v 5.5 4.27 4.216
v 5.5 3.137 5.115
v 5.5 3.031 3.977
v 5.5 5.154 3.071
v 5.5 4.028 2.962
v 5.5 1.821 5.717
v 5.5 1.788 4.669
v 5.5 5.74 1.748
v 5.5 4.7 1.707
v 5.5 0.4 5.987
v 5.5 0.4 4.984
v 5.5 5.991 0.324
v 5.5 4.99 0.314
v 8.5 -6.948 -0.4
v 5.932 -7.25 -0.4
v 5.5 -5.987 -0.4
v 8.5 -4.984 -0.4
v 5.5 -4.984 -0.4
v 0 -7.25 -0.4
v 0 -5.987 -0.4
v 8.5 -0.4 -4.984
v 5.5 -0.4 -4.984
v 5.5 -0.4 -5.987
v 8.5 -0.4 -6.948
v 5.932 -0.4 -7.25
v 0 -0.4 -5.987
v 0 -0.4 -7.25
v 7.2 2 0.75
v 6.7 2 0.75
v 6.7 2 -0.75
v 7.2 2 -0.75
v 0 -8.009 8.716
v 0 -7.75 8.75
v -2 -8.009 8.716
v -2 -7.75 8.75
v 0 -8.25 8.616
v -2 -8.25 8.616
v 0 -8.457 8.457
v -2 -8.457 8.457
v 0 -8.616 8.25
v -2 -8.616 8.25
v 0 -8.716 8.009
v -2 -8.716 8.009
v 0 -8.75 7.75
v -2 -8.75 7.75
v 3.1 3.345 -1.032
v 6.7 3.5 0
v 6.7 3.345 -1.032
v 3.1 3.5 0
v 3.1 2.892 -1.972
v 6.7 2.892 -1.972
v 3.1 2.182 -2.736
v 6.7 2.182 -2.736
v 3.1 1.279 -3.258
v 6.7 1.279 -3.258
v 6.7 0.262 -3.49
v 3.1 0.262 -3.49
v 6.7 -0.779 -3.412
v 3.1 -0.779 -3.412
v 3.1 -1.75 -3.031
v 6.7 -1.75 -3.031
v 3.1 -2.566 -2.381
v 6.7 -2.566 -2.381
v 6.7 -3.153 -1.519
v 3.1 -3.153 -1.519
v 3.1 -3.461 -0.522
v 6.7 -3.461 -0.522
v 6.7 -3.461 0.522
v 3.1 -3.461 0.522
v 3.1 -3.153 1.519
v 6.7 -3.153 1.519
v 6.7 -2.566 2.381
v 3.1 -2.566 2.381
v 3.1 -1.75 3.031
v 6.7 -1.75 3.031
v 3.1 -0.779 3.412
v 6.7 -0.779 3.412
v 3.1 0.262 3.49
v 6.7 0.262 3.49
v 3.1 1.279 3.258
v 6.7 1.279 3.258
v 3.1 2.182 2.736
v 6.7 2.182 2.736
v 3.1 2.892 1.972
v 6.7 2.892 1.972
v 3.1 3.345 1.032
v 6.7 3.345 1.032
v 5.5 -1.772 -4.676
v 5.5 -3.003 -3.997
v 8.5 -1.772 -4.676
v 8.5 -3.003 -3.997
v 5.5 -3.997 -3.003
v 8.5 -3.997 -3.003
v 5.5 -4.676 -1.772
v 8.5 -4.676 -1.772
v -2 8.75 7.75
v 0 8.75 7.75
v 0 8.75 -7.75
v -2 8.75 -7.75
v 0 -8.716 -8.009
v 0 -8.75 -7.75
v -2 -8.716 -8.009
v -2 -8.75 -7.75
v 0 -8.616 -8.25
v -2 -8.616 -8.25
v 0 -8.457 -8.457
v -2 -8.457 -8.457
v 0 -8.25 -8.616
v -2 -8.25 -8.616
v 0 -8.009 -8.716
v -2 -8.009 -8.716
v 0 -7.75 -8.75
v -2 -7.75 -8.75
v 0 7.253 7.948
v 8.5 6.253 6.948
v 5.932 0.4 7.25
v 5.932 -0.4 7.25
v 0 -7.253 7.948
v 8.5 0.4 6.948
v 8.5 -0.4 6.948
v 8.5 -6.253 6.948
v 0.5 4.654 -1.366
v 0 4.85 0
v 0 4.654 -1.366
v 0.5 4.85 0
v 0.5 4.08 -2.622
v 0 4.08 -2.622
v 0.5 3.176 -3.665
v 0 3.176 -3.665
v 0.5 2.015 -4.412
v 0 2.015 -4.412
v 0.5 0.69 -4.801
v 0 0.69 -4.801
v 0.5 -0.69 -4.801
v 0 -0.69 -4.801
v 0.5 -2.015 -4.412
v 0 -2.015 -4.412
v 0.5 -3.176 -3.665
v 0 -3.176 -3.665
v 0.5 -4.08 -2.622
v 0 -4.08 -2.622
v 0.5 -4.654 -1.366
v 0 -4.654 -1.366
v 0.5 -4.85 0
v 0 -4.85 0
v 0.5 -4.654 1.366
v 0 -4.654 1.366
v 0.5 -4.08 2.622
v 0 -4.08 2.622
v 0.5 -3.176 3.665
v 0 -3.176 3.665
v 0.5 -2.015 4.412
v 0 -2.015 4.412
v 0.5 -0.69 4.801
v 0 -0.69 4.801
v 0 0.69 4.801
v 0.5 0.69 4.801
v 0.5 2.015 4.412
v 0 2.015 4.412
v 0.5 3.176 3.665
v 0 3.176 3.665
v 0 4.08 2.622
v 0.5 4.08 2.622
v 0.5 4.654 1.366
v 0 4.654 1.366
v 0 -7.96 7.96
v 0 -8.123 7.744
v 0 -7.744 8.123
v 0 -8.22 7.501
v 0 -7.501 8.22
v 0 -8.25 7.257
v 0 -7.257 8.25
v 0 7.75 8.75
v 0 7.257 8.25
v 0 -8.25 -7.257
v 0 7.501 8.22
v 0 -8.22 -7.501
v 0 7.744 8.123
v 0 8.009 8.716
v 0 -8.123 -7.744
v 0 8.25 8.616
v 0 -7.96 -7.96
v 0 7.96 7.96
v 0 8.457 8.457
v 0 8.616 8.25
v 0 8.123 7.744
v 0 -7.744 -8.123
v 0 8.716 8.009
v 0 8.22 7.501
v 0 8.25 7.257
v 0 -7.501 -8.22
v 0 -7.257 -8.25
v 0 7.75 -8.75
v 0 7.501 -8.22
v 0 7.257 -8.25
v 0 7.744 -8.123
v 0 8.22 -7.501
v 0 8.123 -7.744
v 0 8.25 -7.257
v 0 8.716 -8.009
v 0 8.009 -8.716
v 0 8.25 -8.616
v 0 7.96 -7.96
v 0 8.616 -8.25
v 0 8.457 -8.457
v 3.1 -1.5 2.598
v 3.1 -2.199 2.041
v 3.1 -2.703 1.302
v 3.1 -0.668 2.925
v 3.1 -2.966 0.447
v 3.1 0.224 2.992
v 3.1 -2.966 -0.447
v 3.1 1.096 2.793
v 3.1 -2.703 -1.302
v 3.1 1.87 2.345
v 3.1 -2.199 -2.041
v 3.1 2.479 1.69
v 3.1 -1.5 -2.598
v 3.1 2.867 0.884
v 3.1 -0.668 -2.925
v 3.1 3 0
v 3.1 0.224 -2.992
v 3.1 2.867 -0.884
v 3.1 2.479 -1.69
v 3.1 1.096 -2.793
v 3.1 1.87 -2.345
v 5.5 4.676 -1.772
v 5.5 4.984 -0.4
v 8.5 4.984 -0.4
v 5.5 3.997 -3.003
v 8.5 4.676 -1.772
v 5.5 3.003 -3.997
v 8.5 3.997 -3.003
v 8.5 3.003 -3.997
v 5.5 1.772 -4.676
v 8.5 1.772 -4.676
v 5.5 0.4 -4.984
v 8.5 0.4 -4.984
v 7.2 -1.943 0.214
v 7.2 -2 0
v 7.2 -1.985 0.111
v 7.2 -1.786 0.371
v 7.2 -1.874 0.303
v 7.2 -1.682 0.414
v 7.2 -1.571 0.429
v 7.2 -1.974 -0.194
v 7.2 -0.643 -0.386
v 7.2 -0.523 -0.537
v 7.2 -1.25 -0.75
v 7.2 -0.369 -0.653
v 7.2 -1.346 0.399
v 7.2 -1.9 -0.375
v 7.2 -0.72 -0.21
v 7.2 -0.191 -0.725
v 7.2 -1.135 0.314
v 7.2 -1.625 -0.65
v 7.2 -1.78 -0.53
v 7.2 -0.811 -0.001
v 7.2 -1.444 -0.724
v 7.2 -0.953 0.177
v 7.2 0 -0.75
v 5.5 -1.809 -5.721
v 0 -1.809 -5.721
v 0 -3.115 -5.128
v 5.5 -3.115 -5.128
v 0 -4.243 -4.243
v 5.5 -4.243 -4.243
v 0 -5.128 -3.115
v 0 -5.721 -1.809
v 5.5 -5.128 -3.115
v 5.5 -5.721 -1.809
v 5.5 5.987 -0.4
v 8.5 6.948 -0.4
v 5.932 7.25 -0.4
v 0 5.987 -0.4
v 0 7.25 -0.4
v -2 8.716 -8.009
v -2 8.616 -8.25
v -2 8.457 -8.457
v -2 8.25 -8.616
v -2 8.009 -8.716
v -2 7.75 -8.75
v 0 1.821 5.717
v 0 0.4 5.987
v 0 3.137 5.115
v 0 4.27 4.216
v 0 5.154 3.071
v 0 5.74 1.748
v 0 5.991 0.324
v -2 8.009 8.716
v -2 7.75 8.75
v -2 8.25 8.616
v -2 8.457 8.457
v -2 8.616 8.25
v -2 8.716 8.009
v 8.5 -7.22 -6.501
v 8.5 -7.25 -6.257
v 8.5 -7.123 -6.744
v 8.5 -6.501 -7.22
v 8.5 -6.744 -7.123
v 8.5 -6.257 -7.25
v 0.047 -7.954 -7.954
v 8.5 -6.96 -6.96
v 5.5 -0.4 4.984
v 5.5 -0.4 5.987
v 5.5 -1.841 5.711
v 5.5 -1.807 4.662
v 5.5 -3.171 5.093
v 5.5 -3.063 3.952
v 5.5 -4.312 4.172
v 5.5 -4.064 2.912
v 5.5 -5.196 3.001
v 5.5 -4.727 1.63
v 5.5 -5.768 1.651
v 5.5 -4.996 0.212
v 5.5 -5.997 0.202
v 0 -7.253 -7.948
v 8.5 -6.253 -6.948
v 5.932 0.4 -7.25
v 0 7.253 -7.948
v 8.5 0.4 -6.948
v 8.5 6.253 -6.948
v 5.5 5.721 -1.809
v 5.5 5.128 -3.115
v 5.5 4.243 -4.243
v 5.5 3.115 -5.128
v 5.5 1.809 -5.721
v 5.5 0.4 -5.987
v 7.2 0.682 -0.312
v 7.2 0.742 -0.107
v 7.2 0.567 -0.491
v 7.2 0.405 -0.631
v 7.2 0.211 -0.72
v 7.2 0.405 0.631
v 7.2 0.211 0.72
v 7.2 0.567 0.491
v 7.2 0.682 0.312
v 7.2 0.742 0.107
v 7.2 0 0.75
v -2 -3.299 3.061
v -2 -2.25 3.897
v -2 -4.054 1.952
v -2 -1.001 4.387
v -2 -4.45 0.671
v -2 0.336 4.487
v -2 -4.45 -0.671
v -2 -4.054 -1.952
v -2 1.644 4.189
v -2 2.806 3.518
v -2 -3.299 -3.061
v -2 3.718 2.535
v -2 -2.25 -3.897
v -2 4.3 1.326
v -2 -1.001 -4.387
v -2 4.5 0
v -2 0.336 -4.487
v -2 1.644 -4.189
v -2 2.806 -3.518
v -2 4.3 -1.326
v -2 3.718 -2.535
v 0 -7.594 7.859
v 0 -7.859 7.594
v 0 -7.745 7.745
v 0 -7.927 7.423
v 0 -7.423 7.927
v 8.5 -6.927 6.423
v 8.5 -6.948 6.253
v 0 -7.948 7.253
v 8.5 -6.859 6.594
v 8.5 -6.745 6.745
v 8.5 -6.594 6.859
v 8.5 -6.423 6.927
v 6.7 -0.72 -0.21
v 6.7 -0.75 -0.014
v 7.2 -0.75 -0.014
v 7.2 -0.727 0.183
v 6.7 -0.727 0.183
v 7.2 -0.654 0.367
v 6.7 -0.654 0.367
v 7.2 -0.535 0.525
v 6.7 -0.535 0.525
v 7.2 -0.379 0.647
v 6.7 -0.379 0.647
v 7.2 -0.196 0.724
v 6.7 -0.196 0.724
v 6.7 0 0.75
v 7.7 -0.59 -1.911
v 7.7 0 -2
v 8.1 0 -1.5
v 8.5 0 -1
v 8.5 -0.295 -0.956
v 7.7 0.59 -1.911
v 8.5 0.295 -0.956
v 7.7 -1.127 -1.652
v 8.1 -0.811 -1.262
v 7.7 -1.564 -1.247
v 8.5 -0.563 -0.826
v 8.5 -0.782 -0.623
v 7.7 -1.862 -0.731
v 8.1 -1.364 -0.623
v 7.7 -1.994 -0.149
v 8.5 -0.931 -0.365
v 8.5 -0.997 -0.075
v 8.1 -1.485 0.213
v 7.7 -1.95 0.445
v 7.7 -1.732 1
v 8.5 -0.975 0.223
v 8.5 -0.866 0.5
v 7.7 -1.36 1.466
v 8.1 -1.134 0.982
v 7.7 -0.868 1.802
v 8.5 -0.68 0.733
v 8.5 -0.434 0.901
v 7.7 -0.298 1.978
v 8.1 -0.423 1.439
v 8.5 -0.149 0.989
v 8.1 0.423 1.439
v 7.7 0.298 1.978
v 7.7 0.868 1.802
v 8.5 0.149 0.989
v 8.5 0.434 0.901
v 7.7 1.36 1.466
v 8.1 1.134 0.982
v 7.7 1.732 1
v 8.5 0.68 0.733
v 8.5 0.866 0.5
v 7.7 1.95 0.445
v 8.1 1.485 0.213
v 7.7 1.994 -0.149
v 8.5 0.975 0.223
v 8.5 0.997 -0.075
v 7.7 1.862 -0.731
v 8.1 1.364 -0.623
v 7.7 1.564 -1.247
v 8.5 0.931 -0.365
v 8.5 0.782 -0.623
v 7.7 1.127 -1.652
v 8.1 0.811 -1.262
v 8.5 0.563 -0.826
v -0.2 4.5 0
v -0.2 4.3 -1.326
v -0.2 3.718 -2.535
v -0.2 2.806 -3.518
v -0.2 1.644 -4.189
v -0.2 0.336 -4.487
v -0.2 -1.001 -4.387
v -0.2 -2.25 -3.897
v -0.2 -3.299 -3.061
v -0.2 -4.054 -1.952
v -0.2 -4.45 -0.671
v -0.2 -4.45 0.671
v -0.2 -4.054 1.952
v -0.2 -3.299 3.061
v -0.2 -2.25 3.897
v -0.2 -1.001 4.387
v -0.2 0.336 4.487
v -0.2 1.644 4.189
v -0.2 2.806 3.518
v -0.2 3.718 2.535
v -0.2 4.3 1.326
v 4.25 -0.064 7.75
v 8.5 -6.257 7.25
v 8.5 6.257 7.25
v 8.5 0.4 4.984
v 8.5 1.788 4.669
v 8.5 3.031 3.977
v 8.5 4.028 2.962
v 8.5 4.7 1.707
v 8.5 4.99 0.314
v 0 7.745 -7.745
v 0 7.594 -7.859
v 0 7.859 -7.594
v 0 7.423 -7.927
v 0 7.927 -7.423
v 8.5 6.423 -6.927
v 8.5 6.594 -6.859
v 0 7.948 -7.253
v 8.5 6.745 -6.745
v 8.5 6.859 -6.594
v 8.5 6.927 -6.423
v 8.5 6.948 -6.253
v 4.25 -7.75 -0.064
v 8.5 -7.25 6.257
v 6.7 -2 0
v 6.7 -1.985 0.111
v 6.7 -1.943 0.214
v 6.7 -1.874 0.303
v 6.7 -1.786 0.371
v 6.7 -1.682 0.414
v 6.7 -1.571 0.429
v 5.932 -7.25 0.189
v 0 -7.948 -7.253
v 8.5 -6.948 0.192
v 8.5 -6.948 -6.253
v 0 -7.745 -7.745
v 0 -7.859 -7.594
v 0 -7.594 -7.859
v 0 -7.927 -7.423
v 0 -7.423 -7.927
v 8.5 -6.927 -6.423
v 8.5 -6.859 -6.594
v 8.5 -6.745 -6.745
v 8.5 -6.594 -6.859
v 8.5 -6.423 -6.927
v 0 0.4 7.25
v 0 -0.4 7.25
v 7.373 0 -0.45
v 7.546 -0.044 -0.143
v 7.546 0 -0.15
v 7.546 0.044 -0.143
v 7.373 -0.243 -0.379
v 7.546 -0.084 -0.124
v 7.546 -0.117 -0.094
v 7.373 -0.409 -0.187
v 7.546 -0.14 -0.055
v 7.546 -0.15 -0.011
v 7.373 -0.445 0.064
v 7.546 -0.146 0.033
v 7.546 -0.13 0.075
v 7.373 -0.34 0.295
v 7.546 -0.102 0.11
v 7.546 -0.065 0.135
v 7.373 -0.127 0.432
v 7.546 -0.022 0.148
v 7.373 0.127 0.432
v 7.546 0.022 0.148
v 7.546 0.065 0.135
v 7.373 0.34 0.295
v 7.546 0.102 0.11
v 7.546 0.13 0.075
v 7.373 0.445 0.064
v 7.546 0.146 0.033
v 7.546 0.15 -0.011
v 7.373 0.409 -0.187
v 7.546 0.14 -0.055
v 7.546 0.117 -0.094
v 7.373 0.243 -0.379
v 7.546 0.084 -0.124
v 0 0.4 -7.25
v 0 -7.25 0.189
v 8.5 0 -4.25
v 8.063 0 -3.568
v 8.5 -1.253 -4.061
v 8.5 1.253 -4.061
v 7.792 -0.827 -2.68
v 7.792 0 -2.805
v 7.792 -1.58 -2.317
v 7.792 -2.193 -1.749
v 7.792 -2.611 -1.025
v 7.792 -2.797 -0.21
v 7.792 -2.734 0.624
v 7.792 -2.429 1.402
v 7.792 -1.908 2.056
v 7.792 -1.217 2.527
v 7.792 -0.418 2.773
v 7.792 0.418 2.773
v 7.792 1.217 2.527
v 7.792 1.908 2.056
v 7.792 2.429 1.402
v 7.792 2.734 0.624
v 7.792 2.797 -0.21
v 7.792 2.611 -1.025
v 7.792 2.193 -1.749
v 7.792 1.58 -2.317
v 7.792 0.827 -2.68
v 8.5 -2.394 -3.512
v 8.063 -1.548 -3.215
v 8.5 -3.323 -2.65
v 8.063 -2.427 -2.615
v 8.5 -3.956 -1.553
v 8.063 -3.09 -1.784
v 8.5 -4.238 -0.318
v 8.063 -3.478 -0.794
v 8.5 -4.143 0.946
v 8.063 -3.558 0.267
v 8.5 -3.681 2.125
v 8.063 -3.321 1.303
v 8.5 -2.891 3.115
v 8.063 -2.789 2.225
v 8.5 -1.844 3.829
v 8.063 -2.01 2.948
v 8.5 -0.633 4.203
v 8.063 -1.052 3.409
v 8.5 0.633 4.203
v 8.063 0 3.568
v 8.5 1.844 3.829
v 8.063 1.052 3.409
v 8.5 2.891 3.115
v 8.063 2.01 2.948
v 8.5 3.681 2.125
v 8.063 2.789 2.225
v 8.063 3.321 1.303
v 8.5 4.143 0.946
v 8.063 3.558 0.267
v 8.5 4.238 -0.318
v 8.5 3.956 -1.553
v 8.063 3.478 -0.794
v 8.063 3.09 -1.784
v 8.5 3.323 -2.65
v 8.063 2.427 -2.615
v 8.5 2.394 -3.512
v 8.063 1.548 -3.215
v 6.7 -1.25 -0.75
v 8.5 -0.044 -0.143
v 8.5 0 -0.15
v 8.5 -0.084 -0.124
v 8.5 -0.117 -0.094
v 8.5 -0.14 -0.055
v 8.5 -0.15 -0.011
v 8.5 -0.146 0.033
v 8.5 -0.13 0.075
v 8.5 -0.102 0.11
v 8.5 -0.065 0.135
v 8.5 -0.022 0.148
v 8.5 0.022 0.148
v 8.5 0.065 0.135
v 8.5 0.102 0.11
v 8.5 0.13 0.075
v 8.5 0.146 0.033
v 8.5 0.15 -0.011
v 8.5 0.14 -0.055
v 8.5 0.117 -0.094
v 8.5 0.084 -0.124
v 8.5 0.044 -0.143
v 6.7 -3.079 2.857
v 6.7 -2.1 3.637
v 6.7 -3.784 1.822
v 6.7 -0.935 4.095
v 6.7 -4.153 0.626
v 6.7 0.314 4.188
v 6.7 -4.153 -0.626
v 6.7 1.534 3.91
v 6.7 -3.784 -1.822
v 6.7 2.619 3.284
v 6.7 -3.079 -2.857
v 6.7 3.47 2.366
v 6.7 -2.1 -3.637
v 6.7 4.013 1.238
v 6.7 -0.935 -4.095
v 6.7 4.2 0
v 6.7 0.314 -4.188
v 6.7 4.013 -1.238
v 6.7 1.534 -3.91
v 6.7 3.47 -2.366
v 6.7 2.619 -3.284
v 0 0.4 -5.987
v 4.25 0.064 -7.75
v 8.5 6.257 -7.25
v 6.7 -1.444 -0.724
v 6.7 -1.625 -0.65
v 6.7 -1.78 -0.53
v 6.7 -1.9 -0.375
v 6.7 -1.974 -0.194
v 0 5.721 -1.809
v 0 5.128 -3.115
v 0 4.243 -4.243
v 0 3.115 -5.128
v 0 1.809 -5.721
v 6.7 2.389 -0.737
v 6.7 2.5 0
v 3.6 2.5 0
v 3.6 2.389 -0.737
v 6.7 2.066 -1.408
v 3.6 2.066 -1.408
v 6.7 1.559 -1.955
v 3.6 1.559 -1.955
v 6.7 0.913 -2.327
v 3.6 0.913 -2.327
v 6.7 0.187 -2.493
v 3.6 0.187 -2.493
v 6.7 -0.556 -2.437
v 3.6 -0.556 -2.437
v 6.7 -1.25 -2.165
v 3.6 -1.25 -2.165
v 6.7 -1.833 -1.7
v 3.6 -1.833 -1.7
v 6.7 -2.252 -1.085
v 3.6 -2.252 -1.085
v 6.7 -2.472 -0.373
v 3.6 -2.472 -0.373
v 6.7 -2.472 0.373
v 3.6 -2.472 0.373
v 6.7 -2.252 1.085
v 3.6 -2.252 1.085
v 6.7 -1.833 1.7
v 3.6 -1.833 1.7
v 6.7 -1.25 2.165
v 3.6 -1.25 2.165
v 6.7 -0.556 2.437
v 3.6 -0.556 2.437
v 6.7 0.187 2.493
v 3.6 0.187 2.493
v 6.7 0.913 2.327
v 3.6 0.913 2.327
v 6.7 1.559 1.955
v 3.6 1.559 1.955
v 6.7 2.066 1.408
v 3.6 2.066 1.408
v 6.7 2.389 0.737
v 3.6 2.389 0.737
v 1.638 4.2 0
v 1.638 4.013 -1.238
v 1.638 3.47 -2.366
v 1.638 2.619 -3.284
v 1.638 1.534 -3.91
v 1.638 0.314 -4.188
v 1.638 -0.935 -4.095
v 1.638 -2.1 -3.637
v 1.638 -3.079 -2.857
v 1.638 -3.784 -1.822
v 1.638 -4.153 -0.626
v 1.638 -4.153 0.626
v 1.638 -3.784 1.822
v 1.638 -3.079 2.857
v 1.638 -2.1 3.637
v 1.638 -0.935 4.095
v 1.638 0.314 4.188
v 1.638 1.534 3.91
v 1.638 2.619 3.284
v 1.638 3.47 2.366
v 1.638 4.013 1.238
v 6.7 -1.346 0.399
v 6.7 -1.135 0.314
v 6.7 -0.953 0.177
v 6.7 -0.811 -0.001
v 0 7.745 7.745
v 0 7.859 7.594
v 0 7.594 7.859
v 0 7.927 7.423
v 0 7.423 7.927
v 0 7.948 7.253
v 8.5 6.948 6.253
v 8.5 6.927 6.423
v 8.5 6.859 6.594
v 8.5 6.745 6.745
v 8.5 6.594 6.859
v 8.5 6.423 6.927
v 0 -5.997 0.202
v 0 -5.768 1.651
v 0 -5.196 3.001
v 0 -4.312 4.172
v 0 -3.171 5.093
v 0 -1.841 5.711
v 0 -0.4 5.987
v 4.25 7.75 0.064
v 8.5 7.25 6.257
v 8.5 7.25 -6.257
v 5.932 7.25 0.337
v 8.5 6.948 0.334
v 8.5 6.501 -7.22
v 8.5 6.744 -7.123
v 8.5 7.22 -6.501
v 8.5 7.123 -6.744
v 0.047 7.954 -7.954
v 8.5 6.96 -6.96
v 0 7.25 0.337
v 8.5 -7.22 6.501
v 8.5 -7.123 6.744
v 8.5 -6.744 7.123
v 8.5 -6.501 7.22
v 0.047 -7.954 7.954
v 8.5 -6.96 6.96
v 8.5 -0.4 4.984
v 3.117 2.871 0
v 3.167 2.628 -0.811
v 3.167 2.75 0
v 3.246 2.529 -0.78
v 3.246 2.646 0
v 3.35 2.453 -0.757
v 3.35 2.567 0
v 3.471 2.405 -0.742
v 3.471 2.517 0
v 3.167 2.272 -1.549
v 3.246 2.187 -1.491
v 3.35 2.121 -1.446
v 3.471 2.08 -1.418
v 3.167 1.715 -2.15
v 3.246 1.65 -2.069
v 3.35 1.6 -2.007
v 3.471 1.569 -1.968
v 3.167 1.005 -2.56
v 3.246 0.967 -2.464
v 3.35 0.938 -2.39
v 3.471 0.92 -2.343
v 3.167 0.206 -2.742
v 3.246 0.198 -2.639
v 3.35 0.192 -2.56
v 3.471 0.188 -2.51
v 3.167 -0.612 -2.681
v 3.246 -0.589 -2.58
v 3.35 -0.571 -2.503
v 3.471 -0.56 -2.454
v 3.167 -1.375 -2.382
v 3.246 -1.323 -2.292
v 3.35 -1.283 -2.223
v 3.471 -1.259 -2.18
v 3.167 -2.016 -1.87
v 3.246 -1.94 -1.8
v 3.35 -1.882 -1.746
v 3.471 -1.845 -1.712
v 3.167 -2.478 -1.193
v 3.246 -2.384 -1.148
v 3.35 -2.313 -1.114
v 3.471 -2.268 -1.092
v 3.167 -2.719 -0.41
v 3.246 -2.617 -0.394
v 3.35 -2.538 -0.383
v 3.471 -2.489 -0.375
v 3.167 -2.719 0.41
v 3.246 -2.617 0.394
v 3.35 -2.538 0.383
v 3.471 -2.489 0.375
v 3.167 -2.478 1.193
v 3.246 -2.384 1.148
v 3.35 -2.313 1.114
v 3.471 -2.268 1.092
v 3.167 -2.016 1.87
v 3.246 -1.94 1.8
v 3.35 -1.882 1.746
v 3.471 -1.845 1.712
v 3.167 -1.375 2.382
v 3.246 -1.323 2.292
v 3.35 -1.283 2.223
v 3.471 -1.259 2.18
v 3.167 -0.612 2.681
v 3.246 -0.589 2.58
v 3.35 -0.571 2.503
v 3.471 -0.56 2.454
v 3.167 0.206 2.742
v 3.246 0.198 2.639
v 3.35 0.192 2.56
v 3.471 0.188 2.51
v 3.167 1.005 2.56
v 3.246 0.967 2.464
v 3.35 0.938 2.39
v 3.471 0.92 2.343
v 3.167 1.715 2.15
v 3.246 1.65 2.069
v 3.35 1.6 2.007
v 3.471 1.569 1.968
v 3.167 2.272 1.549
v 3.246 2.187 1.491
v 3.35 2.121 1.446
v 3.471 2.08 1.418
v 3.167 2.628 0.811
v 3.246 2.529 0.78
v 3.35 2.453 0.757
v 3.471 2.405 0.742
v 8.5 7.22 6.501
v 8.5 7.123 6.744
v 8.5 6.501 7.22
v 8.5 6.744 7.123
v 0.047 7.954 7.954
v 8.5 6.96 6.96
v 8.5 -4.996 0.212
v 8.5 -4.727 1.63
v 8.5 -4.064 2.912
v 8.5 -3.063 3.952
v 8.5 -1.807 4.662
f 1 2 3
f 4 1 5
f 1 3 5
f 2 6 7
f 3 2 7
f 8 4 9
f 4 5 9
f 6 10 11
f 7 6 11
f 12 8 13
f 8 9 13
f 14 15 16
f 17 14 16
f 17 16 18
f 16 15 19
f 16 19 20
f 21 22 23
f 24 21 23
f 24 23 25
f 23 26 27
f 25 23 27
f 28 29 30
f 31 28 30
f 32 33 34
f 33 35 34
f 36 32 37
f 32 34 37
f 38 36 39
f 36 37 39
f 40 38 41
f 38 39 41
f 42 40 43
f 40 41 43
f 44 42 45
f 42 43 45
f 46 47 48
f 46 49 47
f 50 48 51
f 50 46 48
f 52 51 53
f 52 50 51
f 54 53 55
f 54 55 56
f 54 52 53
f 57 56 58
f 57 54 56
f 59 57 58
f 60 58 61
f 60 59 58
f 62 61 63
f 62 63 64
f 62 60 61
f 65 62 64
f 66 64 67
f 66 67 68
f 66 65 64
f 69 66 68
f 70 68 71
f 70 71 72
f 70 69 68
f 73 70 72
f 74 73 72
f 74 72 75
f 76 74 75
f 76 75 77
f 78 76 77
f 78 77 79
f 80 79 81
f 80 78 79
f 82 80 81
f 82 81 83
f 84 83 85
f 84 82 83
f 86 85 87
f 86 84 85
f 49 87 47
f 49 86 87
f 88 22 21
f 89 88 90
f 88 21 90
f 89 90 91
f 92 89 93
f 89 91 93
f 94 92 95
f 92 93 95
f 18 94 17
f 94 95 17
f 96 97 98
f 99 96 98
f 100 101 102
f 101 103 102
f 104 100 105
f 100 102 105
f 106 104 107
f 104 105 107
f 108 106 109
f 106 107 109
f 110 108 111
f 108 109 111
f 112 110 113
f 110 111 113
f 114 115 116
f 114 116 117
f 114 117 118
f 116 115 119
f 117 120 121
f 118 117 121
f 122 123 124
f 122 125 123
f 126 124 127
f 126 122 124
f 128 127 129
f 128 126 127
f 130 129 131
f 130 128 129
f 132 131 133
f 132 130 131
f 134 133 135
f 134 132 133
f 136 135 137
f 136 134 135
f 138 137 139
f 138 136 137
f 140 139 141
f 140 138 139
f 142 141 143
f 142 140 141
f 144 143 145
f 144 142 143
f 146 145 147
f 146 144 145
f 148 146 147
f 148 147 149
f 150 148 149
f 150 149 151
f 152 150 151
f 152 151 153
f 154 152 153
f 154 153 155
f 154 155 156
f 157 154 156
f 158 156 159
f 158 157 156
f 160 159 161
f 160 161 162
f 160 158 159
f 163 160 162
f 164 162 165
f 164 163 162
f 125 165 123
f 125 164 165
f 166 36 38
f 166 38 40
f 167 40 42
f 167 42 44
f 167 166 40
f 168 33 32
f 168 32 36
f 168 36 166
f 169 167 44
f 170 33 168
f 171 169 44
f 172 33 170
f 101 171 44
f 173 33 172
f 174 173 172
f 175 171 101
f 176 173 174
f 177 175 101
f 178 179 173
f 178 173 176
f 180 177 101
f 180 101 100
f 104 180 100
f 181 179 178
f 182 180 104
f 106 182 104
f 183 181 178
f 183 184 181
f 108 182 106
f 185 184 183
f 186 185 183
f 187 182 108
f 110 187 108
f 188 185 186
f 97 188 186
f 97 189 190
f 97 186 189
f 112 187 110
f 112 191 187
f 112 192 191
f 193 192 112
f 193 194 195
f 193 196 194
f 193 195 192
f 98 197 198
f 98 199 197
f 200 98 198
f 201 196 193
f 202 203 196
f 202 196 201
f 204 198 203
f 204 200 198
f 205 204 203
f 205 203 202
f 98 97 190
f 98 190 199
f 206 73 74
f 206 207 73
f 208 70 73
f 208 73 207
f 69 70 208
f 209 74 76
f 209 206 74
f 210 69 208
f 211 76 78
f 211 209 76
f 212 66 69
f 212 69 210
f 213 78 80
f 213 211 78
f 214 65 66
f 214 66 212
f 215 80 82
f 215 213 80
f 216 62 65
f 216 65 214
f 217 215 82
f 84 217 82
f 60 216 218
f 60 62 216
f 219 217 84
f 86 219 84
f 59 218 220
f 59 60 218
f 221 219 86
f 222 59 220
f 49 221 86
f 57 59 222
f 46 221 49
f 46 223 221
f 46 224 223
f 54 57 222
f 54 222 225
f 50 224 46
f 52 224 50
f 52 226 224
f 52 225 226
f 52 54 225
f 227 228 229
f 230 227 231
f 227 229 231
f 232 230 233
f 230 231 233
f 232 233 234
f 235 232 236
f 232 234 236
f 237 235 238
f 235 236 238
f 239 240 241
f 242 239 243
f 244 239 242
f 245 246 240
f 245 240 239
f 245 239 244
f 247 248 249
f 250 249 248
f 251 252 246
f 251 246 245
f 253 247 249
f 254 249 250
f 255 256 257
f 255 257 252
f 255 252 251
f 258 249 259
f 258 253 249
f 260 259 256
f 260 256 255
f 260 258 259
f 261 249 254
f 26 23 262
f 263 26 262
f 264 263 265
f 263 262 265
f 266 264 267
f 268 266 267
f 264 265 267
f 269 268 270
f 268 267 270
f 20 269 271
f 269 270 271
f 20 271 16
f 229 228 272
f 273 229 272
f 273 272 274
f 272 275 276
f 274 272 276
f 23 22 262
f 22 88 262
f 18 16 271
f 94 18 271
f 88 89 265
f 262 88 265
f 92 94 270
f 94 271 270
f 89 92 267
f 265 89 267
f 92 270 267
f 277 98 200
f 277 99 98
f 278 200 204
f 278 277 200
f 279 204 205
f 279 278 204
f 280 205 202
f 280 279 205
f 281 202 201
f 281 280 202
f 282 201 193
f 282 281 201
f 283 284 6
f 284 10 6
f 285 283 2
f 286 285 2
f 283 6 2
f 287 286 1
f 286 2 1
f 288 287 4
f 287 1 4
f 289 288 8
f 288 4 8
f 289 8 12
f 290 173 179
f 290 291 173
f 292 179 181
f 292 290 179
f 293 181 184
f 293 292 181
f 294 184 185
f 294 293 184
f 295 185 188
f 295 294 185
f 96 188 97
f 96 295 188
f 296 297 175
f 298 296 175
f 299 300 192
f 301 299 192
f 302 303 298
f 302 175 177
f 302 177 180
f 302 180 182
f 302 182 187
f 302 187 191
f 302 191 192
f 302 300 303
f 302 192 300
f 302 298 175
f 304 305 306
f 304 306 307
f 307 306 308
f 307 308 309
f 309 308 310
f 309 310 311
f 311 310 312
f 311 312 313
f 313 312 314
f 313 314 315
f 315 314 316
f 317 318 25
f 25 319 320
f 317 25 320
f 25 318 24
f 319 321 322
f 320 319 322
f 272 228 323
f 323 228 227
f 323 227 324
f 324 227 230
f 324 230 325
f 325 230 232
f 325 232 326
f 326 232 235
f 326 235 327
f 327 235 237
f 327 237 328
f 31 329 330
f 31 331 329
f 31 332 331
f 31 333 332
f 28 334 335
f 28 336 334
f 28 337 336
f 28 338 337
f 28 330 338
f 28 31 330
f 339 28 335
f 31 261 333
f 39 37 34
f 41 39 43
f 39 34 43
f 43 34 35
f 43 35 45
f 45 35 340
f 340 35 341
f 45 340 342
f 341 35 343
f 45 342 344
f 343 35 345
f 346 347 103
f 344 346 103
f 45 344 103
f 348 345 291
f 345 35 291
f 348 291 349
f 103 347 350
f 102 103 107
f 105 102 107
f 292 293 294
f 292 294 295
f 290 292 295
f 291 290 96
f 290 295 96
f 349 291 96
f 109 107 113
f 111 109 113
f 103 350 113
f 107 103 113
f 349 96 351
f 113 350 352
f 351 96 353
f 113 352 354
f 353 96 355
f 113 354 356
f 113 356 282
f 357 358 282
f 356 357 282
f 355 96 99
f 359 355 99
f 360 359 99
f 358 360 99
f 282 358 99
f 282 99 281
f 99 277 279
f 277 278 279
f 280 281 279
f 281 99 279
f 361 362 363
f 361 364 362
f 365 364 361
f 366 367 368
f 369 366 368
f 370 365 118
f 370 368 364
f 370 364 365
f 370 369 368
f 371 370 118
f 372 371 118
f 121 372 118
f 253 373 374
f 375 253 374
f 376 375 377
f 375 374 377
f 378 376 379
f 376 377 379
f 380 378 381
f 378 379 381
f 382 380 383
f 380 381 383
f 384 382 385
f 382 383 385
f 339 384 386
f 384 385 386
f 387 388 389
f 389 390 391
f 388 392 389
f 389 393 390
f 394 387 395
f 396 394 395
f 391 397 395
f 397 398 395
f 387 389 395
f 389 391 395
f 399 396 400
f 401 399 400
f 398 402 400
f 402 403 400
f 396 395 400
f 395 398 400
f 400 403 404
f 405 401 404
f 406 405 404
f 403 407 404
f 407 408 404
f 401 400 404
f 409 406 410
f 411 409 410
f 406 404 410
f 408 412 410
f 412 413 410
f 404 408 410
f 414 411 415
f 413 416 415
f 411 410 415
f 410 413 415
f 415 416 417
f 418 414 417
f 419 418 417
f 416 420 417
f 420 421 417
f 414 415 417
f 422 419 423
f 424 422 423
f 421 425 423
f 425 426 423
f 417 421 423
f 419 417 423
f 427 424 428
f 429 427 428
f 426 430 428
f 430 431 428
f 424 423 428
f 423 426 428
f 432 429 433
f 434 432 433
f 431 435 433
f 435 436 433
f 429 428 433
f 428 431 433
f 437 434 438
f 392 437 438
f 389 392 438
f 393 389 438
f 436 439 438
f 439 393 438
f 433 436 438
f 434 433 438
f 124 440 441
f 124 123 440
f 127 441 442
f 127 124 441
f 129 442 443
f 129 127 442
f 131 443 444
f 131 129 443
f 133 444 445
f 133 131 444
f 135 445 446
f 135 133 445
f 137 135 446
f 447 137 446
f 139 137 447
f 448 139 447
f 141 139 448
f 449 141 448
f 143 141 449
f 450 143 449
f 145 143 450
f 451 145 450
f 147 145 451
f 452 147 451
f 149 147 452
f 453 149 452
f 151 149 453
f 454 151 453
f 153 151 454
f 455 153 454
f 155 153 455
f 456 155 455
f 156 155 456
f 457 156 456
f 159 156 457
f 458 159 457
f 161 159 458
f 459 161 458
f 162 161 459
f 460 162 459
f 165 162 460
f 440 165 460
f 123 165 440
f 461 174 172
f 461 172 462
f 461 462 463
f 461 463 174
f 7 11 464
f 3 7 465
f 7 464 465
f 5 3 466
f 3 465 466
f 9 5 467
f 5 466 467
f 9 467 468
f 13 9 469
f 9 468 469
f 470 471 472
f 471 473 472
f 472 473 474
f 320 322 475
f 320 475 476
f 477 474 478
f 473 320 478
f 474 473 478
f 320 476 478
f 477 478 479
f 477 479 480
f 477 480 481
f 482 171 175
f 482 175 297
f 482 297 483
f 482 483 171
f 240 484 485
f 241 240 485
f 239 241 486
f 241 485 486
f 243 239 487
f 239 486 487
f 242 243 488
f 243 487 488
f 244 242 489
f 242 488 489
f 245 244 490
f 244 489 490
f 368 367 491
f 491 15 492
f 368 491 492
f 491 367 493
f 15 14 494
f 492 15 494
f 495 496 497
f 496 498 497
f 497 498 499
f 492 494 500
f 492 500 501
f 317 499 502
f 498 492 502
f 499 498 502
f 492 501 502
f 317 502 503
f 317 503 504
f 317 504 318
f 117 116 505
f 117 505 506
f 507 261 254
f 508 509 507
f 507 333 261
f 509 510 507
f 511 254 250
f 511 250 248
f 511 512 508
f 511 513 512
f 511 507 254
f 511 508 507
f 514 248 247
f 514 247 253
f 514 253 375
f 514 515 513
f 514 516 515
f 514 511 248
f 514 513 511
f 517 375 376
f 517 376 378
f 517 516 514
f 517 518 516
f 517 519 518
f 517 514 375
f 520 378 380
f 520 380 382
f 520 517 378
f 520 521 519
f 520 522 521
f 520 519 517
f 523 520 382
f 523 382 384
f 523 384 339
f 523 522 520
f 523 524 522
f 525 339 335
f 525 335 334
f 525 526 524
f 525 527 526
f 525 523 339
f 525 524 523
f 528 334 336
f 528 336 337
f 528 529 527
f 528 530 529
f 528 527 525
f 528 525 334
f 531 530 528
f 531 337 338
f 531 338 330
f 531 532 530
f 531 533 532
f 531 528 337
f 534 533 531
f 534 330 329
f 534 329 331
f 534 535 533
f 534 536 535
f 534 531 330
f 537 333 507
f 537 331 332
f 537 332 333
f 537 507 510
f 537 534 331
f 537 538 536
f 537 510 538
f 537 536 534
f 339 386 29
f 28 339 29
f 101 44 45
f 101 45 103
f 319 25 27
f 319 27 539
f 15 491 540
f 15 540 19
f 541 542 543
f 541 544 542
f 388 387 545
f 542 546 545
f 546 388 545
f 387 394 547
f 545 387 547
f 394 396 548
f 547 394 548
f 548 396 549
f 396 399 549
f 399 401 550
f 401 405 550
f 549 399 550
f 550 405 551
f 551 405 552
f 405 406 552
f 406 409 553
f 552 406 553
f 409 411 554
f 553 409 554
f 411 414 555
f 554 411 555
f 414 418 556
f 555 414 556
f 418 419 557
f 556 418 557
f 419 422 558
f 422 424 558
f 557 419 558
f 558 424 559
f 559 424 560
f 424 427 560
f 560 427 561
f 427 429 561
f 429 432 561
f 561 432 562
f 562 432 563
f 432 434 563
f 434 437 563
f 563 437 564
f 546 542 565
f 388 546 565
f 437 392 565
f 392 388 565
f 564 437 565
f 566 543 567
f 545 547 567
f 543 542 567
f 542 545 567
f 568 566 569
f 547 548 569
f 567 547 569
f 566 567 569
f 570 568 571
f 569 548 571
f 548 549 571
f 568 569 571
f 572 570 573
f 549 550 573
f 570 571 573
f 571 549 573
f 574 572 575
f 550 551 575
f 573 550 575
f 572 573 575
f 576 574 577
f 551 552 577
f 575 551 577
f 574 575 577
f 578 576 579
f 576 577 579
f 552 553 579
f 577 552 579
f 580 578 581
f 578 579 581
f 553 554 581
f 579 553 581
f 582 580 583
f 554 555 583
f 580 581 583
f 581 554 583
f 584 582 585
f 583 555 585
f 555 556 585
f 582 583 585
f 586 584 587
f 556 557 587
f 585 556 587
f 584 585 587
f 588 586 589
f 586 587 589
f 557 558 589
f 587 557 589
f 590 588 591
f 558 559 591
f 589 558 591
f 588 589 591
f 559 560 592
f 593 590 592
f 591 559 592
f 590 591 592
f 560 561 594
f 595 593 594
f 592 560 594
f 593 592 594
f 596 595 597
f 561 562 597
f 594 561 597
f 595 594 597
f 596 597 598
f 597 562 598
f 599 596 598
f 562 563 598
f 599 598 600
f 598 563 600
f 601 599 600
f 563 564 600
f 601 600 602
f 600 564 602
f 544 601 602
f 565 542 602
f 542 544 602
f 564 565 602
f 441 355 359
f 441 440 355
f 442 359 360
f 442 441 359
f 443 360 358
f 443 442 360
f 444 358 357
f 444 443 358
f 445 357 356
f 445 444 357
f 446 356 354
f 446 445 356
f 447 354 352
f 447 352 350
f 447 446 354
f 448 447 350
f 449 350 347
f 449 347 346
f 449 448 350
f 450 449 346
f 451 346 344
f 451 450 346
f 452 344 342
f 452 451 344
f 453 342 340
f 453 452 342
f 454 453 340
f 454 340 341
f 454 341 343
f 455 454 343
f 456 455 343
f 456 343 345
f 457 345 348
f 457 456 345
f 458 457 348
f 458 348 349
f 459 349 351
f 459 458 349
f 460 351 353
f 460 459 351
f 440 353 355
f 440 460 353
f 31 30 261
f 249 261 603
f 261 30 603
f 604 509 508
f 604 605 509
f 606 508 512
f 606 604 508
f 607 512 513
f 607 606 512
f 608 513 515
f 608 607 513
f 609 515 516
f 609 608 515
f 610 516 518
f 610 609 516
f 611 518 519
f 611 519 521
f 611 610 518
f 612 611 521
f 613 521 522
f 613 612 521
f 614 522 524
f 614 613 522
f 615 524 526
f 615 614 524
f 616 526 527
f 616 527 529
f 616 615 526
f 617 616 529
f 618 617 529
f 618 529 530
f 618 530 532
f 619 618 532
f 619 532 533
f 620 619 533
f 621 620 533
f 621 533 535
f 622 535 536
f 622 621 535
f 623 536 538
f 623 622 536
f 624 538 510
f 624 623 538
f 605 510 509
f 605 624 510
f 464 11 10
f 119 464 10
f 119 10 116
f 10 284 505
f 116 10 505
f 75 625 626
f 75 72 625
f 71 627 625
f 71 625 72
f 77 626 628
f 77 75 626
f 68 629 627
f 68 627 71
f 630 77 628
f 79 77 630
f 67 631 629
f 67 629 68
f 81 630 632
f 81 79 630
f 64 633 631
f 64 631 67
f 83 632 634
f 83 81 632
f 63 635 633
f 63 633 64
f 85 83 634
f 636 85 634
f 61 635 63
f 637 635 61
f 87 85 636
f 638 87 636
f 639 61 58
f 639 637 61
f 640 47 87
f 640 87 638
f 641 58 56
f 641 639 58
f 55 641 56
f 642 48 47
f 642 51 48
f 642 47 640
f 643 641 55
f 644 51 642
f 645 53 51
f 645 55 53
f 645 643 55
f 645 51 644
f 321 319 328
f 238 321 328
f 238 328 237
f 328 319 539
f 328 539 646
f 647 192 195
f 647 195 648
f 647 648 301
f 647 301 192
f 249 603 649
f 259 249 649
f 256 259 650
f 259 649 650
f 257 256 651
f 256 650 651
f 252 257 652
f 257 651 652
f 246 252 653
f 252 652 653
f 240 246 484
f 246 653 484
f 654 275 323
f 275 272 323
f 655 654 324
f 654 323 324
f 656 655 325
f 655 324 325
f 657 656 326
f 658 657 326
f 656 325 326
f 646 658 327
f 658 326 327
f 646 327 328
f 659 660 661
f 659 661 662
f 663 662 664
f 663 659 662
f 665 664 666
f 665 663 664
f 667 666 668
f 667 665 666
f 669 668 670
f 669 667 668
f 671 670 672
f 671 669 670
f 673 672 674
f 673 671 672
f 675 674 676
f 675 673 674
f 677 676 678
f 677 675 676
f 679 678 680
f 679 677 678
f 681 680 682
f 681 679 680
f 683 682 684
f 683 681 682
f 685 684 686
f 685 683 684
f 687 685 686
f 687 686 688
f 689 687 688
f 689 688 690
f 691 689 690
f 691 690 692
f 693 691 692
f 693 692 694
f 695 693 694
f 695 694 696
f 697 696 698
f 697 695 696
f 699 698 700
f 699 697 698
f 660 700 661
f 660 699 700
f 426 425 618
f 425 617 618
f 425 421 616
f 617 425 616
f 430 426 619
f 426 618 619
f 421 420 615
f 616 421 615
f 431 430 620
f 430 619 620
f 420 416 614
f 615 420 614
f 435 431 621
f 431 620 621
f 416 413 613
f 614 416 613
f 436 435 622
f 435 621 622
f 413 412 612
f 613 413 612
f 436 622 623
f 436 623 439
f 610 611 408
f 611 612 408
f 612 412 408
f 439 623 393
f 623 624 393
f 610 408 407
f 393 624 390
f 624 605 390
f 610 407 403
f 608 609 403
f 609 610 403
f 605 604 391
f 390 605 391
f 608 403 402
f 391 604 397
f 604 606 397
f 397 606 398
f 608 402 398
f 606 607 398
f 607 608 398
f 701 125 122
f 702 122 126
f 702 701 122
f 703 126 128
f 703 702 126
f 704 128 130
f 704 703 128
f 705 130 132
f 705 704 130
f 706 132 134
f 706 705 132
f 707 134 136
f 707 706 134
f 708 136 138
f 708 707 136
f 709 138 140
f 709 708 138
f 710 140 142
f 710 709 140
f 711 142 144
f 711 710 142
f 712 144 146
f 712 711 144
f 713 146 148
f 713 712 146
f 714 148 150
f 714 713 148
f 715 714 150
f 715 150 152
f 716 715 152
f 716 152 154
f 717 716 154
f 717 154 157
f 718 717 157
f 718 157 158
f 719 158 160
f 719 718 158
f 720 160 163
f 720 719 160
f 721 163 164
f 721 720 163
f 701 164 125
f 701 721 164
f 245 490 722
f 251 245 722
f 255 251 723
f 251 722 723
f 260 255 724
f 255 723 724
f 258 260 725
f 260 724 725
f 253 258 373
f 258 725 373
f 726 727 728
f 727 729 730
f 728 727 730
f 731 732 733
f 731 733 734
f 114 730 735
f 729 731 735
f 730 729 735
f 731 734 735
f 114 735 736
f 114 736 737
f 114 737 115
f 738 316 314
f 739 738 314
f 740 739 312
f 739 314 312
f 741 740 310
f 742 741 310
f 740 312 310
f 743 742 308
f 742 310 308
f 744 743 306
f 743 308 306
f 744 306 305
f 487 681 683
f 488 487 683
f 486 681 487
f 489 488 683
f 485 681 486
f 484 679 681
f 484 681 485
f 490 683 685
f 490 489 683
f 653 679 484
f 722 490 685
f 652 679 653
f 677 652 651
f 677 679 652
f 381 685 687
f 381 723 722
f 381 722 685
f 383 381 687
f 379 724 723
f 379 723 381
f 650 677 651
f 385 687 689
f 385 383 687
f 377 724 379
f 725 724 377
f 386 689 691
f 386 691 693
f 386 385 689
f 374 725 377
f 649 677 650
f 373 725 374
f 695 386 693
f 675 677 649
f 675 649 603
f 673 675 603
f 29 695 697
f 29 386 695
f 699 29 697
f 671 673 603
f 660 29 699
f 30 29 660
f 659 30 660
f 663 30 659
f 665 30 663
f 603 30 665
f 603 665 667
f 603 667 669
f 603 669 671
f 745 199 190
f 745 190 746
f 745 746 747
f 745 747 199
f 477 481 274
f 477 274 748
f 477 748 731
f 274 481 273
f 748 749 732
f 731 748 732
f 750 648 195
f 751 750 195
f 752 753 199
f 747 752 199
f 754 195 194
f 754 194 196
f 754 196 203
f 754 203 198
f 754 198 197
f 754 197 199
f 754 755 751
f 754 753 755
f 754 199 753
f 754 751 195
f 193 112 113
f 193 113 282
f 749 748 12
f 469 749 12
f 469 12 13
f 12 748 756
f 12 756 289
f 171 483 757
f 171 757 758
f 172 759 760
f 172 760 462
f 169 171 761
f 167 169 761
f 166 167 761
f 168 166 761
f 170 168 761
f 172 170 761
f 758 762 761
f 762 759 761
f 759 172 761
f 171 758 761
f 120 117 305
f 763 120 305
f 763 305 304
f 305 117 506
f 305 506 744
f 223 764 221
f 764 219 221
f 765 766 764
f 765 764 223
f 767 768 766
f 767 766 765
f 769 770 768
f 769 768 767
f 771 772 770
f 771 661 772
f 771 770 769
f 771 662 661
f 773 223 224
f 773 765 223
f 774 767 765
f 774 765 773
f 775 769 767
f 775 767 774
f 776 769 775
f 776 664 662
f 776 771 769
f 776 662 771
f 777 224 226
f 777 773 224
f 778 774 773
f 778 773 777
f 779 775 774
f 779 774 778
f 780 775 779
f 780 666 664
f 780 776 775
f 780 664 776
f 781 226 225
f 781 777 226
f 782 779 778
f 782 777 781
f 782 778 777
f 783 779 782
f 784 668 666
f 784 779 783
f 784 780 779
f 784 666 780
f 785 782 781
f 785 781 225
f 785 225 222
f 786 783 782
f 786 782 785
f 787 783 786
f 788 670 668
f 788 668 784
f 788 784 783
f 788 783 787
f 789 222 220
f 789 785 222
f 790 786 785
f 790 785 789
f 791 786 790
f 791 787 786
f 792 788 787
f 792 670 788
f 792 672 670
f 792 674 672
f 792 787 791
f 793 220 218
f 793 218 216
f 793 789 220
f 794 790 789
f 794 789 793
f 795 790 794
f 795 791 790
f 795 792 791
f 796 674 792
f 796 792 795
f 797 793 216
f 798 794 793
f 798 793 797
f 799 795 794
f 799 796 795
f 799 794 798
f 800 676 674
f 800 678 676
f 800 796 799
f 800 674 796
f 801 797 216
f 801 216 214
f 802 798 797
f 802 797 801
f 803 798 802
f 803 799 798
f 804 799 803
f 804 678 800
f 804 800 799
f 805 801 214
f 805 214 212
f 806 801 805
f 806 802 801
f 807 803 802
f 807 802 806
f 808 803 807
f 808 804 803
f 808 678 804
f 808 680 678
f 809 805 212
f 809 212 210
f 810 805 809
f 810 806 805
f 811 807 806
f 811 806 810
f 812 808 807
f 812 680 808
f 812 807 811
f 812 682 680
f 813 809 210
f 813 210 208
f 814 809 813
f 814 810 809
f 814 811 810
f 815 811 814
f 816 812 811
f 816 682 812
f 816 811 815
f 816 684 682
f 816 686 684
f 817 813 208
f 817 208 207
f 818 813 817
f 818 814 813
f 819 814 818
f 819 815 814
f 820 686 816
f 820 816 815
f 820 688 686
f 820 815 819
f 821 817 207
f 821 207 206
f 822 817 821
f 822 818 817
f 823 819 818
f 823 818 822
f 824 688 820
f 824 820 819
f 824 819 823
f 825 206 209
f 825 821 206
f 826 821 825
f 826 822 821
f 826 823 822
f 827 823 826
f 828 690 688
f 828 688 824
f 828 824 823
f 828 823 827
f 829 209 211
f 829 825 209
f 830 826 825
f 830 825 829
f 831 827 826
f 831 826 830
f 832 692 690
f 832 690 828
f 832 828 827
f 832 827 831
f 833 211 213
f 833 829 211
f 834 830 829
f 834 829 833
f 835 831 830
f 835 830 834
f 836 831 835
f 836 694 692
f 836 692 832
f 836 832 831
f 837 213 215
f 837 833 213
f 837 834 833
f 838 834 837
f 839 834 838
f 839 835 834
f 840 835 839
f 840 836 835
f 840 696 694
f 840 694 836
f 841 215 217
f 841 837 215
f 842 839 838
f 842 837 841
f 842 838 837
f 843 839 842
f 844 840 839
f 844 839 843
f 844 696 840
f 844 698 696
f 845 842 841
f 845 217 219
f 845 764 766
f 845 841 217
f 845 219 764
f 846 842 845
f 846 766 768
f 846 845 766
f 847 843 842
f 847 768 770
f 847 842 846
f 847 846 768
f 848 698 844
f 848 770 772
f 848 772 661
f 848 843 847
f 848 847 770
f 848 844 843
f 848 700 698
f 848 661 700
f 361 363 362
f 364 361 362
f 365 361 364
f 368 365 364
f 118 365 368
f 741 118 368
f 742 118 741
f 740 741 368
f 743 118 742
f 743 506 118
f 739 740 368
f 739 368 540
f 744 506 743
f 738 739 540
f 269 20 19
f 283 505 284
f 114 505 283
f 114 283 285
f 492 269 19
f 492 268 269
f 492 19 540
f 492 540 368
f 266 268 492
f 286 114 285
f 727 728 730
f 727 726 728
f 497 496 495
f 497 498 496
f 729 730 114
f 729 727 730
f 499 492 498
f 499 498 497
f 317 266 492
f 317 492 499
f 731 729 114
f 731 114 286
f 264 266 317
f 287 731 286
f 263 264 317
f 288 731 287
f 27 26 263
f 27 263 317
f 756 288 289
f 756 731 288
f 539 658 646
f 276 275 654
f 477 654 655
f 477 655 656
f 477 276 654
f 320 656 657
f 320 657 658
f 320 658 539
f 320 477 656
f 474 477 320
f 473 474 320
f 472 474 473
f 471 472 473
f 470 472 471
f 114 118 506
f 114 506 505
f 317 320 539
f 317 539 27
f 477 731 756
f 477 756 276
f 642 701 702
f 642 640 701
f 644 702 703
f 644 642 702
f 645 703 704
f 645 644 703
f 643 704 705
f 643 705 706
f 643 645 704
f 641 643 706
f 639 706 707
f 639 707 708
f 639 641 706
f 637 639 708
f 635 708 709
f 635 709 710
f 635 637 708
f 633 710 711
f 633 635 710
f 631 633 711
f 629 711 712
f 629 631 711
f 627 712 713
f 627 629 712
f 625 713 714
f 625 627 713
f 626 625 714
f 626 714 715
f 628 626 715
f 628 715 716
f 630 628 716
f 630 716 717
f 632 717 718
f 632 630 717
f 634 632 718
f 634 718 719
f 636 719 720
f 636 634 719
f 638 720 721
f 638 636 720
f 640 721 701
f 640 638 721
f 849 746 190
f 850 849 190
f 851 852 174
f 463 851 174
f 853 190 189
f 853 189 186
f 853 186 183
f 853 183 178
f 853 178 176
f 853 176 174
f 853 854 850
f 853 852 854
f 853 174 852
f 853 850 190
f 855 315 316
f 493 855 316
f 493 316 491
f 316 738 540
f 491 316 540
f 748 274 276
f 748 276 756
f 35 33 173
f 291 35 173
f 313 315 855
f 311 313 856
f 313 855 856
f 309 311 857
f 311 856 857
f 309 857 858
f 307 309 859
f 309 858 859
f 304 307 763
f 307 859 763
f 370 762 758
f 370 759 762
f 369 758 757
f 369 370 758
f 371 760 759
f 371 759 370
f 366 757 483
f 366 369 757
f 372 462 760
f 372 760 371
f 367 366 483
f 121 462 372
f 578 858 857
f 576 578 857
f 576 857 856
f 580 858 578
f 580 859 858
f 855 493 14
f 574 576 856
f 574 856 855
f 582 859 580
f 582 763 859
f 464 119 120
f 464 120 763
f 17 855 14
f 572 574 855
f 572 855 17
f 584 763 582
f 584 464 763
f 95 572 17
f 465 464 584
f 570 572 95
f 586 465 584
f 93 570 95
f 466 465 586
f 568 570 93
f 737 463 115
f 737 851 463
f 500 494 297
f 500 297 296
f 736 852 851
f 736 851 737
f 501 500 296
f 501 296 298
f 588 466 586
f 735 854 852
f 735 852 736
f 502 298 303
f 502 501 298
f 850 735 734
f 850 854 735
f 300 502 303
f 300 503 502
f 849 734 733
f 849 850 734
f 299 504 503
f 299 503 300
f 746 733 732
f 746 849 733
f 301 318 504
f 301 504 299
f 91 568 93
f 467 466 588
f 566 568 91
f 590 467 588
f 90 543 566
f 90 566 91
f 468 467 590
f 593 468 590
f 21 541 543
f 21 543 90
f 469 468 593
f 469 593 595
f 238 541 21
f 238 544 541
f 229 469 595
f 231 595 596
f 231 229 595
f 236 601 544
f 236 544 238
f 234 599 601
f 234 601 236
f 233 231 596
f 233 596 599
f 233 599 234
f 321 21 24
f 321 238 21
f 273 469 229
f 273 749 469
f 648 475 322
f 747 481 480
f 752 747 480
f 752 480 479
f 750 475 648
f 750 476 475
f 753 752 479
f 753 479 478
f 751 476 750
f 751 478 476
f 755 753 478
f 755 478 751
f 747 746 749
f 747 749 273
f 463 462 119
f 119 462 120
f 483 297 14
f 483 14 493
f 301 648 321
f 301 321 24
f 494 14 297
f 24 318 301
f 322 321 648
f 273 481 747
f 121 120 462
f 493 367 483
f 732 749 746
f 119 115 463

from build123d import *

# Parameters (mm, degrees)
FILLET1_R           = 1
SHELL4_T            = -0.3
SKETCH3_W           = 17.5
SKETCH3_H           = 17.5
BOSS_EXTRUDE1_DEPTH = 2
FILLET2_R           = 1
BOSS_EXTRUDE4_DEPTH = 8.5
FILLET4_R           = 0.5
CUT_EXTRUDE1_DEPTH  = 0.5


# Read off the part's stored shape, not the designer's step: Boss-Extrude4
with BuildPart() as part:
    # Sketch1 → Loft1 section 0
    with BuildSketch(Plane(origin=(0, 0, 0), x_dir=(0, 0, -1), z_dir=(1, 0, 0))):
        with BuildLine():
            Line((-8.25, -8.25), (8.25, -8.25))
            Line((8.25, -8.25), (8.25, 8.25))
            Line((8.25, 8.25), (-8.25, 8.25))
            Line((-8.25, 8.25), (-8.25, -8.25))
        make_face()
    # Sketch2 → Loft1 section 1
    with BuildSketch(Plane.ZY.offset(-8.5)):
        with BuildLine():
            Line((-7.25, -7.25), (7.25, -7.25))
            Line((7.25, -7.25), (7.25, 7.25))
            Line((7.25, 7.25), (-7.25, 7.25))
            Line((-7.25, 7.25), (-7.25, -7.25))
        make_face()
    loft()

    # Fillet1
    fillet1_edges = [part.edges().sort_by_distance(p)[0] for p in [
        (4.25, -7.75, -7.75),
        (4.25, -7.75, 7.75),
        (4.25, 7.75, -7.75),
        (4.25, 7.75, 7.75),
    ]]
    fillet(fillet1_edges, radius=FILLET1_R)

    # Shell4
    shell4_openings = [part.faces().sort_by_distance(p)[0] for p in [
        (8.5, 0, 0),
        (0, 0, 0),
    ]]
    offset(amount=SHELL4_T, openings=shell4_openings)

    # Sketch3 → Boss-Extrude1 (add)
    with BuildSketch(Plane(origin=(0, 0, 0), x_dir=(0, 0, -1), z_dir=(1, 0, 0))):
        Rectangle(SKETCH3_W, SKETCH3_H)
    extrude(amount=-BOSS_EXTRUDE1_DEPTH)

    # Fillet2
    fillet2_edges = [part.edges().sort_by_distance(p)[0] for p in [
        (-1, 8.75, -8.75),
        (-1, -8.75, -8.75),
        (-1, -8.75, 8.75),
        (-1, 8.75, 8.75),
    ]]
    fillet(fillet2_edges, radius=FILLET2_R)

    # Sketch5 → Revolve3 (revolve)
    with BuildSketch(Plane.XY, mode=Mode.PRIVATE) as revolve3_sk:
        with BuildLine():
            Line((0, 0), (0, 6))
            Line((0, 6), (5.5, 6))
            Line((5.5, 6), (5.5, 5))
            Line((5.5, 5), (8.5, 5))
            Line((8.5, 5), (8.5, 4.25))
            ThreePointArc((8.5, 4.25), (7.905950455, 3.193995394), (7.7, 2))
            Line((7.7, 2), (8.5, 1))
            Line((8.5, 1), (8.5, 0))
            Line((8.5, 0), (0, 0))
        make_face()
    revolve(revolve3_sk.sketch.rotate(Axis((8.5, 0, 0), (-1, 0, 0)), 90), axis=Axis((8.5, 0, 0), (-1, 0, 0)))

    # Boss-Extrude4 outline → Boss-Extrude4 (add)
    with BuildSketch(Plane(origin=(0, 0, 0), x_dir=(0, 0, -1), z_dir=(1, 0, 0))):
        with BuildLine():
            Line((7.25, -0.4), (7.25, 0.4))
            Line((7.25, 0.4), (4.983974318, 0.4))
            ThreePointArc((4.983974318, 0.4), (5, 0), (4.983974318, -0.4))
            Line((4.983974318, -0.4), (7.25, -0.4))
        make_face()
        with BuildLine():
            Line((-0.211850638, -4.995509915), (-0.188879124, -7.25))
            Line((-0.188879124, -7.25), (0.4, -7.25))
            Line((0.4, -7.25), (0.4, -4.983974318))
            ThreePointArc((0.4, -4.983974318), (0.094251329, -4.99911159), (-0.211850638, -4.995509915))
        make_face()
        with BuildLine():
            Line((-0.336622937, 7.25), (-0.313596871, 4.99015601))
            ThreePointArc((-0.313596871, 4.99015601), (0.04331199, 4.999812404), (0.4, 4.983974318))
            Line((0.4, 4.983974318), (0.4, 7.25))
            Line((0.4, 7.25), (-0.336622937, 7.25))
        make_face()
        with BuildLine():
            Line((-4.983974318, 0.4), (-7.25, 0.4))
            Line((-7.25, 0.4), (-7.25, -0.4))
            Line((-7.25, -0.4), (-4.983974318, -0.4))
            ThreePointArc((-4.983974318, -0.4), (-5, 0), (-4.983974318, 0.4))
        make_face()
    extrude(amount=BOSS_EXTRUDE4_DEPTH)

    # Sketch7 → Cut-Revolve2 (revolve, cut)
    with BuildSketch(Plane.XY):
        Polygon((-2, 0), (-2, 4.5), (-0.2, 4.5), (0, 4.85), (0.5, 4.85), (1.6375, 4.2), (6.7, 4.2), (6.7, 3.5), (3.1, 3.5), (3.1, 2.5), (6.7, 2.5), (6.7, 0), align=None)
    revolve(axis=Axis((6.7, 0, 0), (-1, 0, 0)), mode=Mode.SUBTRACT)

    # Fillet4
    fillet4_edges = [part.edges().sort_by_distance(p)[0] for p in [
        (3.1, -2.5, 0),
    ]]
    fillet(fillet4_edges, radius=FILLET4_R)

    # Sketch9 → Cut-Extrude1 (cut)
    with BuildSketch(Plane.ZY.offset(-6.7)):
        with BuildLine():
            Line((0.75, 2), (-0.75, 2))
            Line((-0.75, 2), (-0.75, -1.25))
            ThreePointArc((-0.75, -1.25), (-0.530330086, -1.780330086), (0, -2))
            ThreePointArc((0, -2), (0.303045763, -1.874474335), (0.428571429, -1.571428571))
            ThreePointArc((0.428571429, -1.571428571), (0.251190476, -1.039285714), (-0.21, -0.72))
            ThreePointArc((-0.21, -0.72), (0.45, -0.6), (0.75, 0))
            Line((0.75, 0), (0.75, 2))
        make_face()
    extrude(amount=-CUT_EXTRUDE1_DEPTH, mode=Mode.SUBTRACT)

    # Sketch10 → Cut-Revolve3 (revolve, cut)
    with BuildSketch(Plane.XY, mode=Mode.PRIVATE) as cut_revolve3_sk:
        Polygon((8.5, 0), (6.372171637, 0), (6.372171637, 0.75), (7.2, 0.75), (7.546410162, 0.15), (8.5, 0.15), align=None)
    revolve(cut_revolve3_sk.sketch.rotate(Axis((8.5, 0, 0), (-1, 0, 0)), 90), axis=Axis((8.5, 0, 0), (-1, 0, 0)), mode=Mode.SUBTRACT)


solid = part.part
